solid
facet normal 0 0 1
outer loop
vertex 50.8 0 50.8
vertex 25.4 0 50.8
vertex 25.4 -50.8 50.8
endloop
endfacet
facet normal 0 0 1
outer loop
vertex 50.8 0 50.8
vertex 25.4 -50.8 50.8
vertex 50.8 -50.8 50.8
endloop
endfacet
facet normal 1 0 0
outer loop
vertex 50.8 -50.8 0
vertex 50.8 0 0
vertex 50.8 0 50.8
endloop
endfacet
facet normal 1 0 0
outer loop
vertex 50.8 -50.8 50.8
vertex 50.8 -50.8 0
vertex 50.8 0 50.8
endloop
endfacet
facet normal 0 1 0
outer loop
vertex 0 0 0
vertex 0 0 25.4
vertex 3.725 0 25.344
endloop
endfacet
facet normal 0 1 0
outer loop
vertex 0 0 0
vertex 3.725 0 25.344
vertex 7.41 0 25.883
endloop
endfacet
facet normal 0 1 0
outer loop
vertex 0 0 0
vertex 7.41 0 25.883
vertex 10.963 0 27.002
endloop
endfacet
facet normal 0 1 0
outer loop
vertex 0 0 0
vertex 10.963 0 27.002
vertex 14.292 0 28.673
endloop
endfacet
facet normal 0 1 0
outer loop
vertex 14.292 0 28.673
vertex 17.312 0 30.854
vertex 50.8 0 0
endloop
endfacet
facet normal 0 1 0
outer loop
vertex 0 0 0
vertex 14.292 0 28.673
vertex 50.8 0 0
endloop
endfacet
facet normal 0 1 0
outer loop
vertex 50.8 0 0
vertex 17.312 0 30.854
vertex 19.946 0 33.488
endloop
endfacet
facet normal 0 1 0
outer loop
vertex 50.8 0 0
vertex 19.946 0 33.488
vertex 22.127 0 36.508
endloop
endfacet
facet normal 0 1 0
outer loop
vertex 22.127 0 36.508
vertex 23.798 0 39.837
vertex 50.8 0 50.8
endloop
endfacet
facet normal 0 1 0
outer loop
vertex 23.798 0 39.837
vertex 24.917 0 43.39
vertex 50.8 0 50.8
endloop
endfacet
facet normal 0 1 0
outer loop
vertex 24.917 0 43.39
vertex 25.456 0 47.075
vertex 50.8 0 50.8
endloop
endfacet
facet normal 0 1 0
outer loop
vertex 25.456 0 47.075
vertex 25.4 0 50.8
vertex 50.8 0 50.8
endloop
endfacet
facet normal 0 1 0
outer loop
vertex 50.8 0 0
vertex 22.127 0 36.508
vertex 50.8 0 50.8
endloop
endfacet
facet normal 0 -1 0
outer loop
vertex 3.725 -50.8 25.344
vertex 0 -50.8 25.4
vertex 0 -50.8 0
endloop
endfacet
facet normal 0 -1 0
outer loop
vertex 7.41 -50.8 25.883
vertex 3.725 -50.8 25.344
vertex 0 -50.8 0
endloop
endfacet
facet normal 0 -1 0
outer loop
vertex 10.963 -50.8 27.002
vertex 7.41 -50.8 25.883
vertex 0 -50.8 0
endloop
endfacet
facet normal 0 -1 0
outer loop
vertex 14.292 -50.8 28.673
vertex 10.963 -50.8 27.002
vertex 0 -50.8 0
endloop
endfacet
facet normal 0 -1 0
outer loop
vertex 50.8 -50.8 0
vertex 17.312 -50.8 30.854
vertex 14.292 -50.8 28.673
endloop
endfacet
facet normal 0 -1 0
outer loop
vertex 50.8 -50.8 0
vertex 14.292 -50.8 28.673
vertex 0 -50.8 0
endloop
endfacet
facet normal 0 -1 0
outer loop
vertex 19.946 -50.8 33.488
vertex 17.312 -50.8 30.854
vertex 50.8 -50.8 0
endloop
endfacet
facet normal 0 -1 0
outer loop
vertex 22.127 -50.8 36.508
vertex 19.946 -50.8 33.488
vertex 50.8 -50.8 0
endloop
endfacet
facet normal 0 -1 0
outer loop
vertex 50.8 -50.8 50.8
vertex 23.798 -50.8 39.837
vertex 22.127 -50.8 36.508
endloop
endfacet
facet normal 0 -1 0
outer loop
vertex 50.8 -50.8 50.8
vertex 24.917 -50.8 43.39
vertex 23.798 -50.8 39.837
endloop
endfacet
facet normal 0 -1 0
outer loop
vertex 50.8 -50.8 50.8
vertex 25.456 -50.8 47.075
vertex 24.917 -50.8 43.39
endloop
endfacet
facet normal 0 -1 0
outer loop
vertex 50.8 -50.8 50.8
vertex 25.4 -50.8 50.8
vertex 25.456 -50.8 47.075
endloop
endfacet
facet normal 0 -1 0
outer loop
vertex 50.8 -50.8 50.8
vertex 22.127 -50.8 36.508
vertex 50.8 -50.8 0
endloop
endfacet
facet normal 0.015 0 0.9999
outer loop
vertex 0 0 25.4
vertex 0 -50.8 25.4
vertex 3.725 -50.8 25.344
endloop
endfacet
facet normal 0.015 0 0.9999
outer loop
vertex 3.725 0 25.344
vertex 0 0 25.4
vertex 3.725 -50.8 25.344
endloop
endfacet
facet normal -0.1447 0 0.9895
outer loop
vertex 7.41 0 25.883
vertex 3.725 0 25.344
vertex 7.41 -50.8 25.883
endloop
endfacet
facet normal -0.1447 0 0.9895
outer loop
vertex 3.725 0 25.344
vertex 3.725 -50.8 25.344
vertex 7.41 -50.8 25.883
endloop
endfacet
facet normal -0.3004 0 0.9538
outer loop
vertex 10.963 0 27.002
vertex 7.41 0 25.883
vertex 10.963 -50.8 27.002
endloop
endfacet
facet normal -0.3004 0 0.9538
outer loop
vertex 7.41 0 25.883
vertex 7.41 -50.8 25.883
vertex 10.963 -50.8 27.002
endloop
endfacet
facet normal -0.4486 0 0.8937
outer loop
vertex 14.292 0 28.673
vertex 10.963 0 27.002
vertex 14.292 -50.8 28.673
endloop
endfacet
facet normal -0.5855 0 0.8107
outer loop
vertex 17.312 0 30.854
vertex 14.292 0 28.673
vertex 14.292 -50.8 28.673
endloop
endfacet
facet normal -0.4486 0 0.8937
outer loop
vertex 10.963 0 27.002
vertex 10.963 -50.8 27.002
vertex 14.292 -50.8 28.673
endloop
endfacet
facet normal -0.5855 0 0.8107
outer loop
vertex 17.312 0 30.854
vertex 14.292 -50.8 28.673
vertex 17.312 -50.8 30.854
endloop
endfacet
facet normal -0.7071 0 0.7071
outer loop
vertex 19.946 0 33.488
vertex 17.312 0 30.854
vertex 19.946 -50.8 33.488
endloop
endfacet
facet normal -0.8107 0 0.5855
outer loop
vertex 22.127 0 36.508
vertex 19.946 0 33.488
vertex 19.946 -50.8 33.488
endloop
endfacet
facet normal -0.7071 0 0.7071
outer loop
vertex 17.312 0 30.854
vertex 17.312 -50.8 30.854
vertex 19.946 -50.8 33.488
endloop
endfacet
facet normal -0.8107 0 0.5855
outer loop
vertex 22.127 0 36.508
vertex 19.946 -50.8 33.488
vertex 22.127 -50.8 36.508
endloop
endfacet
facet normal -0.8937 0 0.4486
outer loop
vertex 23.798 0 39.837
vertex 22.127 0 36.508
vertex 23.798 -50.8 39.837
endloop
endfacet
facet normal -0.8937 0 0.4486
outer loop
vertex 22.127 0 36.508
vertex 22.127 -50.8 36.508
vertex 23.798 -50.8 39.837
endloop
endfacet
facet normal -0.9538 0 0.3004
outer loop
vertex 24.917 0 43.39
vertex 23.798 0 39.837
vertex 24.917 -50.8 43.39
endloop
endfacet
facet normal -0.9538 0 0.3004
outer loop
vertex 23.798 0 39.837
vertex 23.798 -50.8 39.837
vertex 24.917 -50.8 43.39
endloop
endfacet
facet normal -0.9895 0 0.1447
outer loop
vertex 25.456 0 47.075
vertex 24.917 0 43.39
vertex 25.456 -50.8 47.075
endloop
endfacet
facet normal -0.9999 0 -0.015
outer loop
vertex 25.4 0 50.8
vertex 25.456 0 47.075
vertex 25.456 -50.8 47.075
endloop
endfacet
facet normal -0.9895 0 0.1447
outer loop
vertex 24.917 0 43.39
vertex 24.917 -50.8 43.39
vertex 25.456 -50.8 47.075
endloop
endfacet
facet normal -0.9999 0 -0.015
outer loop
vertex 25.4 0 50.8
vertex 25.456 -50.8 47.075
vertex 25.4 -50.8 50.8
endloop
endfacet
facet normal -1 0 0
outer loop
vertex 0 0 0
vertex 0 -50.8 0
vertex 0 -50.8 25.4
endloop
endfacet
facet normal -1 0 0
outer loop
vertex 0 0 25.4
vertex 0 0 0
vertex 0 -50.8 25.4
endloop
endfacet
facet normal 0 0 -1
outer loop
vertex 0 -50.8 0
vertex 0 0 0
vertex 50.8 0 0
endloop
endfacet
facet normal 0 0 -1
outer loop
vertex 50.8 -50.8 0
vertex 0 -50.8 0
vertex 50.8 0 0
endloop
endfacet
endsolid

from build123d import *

# Parameters (mm, degrees)
F0_W     = 50.8
F0_H     = 50.8
F1_DEPTH = 50.8
F4_DEPTH = 50.8


with BuildPart() as f1:
    # F0 (on Front) → F1 (new body)
    with BuildSketch(Plane.XZ):
        with Locations((25.4, 25.4)):
            Rectangle(F0_W, F0_H)
    extrude(amount=F1_DEPTH)

    # F2 (on face) → F4 (cut)
    with BuildSketch(Plane.XZ.offset(50.8)):
        with BuildLine():
            Line((0, 50.8), (0, 25.4))
            ThreePointArc((0, 25.4), (18.682128, 32.117872), (25.4, 50.8))
            Line((25.4, 50.8), (0, 50.8))
        make_face()
    extrude(amount=-F4_DEPTH, mode=Mode.SUBTRACT)


solid = f1.part
